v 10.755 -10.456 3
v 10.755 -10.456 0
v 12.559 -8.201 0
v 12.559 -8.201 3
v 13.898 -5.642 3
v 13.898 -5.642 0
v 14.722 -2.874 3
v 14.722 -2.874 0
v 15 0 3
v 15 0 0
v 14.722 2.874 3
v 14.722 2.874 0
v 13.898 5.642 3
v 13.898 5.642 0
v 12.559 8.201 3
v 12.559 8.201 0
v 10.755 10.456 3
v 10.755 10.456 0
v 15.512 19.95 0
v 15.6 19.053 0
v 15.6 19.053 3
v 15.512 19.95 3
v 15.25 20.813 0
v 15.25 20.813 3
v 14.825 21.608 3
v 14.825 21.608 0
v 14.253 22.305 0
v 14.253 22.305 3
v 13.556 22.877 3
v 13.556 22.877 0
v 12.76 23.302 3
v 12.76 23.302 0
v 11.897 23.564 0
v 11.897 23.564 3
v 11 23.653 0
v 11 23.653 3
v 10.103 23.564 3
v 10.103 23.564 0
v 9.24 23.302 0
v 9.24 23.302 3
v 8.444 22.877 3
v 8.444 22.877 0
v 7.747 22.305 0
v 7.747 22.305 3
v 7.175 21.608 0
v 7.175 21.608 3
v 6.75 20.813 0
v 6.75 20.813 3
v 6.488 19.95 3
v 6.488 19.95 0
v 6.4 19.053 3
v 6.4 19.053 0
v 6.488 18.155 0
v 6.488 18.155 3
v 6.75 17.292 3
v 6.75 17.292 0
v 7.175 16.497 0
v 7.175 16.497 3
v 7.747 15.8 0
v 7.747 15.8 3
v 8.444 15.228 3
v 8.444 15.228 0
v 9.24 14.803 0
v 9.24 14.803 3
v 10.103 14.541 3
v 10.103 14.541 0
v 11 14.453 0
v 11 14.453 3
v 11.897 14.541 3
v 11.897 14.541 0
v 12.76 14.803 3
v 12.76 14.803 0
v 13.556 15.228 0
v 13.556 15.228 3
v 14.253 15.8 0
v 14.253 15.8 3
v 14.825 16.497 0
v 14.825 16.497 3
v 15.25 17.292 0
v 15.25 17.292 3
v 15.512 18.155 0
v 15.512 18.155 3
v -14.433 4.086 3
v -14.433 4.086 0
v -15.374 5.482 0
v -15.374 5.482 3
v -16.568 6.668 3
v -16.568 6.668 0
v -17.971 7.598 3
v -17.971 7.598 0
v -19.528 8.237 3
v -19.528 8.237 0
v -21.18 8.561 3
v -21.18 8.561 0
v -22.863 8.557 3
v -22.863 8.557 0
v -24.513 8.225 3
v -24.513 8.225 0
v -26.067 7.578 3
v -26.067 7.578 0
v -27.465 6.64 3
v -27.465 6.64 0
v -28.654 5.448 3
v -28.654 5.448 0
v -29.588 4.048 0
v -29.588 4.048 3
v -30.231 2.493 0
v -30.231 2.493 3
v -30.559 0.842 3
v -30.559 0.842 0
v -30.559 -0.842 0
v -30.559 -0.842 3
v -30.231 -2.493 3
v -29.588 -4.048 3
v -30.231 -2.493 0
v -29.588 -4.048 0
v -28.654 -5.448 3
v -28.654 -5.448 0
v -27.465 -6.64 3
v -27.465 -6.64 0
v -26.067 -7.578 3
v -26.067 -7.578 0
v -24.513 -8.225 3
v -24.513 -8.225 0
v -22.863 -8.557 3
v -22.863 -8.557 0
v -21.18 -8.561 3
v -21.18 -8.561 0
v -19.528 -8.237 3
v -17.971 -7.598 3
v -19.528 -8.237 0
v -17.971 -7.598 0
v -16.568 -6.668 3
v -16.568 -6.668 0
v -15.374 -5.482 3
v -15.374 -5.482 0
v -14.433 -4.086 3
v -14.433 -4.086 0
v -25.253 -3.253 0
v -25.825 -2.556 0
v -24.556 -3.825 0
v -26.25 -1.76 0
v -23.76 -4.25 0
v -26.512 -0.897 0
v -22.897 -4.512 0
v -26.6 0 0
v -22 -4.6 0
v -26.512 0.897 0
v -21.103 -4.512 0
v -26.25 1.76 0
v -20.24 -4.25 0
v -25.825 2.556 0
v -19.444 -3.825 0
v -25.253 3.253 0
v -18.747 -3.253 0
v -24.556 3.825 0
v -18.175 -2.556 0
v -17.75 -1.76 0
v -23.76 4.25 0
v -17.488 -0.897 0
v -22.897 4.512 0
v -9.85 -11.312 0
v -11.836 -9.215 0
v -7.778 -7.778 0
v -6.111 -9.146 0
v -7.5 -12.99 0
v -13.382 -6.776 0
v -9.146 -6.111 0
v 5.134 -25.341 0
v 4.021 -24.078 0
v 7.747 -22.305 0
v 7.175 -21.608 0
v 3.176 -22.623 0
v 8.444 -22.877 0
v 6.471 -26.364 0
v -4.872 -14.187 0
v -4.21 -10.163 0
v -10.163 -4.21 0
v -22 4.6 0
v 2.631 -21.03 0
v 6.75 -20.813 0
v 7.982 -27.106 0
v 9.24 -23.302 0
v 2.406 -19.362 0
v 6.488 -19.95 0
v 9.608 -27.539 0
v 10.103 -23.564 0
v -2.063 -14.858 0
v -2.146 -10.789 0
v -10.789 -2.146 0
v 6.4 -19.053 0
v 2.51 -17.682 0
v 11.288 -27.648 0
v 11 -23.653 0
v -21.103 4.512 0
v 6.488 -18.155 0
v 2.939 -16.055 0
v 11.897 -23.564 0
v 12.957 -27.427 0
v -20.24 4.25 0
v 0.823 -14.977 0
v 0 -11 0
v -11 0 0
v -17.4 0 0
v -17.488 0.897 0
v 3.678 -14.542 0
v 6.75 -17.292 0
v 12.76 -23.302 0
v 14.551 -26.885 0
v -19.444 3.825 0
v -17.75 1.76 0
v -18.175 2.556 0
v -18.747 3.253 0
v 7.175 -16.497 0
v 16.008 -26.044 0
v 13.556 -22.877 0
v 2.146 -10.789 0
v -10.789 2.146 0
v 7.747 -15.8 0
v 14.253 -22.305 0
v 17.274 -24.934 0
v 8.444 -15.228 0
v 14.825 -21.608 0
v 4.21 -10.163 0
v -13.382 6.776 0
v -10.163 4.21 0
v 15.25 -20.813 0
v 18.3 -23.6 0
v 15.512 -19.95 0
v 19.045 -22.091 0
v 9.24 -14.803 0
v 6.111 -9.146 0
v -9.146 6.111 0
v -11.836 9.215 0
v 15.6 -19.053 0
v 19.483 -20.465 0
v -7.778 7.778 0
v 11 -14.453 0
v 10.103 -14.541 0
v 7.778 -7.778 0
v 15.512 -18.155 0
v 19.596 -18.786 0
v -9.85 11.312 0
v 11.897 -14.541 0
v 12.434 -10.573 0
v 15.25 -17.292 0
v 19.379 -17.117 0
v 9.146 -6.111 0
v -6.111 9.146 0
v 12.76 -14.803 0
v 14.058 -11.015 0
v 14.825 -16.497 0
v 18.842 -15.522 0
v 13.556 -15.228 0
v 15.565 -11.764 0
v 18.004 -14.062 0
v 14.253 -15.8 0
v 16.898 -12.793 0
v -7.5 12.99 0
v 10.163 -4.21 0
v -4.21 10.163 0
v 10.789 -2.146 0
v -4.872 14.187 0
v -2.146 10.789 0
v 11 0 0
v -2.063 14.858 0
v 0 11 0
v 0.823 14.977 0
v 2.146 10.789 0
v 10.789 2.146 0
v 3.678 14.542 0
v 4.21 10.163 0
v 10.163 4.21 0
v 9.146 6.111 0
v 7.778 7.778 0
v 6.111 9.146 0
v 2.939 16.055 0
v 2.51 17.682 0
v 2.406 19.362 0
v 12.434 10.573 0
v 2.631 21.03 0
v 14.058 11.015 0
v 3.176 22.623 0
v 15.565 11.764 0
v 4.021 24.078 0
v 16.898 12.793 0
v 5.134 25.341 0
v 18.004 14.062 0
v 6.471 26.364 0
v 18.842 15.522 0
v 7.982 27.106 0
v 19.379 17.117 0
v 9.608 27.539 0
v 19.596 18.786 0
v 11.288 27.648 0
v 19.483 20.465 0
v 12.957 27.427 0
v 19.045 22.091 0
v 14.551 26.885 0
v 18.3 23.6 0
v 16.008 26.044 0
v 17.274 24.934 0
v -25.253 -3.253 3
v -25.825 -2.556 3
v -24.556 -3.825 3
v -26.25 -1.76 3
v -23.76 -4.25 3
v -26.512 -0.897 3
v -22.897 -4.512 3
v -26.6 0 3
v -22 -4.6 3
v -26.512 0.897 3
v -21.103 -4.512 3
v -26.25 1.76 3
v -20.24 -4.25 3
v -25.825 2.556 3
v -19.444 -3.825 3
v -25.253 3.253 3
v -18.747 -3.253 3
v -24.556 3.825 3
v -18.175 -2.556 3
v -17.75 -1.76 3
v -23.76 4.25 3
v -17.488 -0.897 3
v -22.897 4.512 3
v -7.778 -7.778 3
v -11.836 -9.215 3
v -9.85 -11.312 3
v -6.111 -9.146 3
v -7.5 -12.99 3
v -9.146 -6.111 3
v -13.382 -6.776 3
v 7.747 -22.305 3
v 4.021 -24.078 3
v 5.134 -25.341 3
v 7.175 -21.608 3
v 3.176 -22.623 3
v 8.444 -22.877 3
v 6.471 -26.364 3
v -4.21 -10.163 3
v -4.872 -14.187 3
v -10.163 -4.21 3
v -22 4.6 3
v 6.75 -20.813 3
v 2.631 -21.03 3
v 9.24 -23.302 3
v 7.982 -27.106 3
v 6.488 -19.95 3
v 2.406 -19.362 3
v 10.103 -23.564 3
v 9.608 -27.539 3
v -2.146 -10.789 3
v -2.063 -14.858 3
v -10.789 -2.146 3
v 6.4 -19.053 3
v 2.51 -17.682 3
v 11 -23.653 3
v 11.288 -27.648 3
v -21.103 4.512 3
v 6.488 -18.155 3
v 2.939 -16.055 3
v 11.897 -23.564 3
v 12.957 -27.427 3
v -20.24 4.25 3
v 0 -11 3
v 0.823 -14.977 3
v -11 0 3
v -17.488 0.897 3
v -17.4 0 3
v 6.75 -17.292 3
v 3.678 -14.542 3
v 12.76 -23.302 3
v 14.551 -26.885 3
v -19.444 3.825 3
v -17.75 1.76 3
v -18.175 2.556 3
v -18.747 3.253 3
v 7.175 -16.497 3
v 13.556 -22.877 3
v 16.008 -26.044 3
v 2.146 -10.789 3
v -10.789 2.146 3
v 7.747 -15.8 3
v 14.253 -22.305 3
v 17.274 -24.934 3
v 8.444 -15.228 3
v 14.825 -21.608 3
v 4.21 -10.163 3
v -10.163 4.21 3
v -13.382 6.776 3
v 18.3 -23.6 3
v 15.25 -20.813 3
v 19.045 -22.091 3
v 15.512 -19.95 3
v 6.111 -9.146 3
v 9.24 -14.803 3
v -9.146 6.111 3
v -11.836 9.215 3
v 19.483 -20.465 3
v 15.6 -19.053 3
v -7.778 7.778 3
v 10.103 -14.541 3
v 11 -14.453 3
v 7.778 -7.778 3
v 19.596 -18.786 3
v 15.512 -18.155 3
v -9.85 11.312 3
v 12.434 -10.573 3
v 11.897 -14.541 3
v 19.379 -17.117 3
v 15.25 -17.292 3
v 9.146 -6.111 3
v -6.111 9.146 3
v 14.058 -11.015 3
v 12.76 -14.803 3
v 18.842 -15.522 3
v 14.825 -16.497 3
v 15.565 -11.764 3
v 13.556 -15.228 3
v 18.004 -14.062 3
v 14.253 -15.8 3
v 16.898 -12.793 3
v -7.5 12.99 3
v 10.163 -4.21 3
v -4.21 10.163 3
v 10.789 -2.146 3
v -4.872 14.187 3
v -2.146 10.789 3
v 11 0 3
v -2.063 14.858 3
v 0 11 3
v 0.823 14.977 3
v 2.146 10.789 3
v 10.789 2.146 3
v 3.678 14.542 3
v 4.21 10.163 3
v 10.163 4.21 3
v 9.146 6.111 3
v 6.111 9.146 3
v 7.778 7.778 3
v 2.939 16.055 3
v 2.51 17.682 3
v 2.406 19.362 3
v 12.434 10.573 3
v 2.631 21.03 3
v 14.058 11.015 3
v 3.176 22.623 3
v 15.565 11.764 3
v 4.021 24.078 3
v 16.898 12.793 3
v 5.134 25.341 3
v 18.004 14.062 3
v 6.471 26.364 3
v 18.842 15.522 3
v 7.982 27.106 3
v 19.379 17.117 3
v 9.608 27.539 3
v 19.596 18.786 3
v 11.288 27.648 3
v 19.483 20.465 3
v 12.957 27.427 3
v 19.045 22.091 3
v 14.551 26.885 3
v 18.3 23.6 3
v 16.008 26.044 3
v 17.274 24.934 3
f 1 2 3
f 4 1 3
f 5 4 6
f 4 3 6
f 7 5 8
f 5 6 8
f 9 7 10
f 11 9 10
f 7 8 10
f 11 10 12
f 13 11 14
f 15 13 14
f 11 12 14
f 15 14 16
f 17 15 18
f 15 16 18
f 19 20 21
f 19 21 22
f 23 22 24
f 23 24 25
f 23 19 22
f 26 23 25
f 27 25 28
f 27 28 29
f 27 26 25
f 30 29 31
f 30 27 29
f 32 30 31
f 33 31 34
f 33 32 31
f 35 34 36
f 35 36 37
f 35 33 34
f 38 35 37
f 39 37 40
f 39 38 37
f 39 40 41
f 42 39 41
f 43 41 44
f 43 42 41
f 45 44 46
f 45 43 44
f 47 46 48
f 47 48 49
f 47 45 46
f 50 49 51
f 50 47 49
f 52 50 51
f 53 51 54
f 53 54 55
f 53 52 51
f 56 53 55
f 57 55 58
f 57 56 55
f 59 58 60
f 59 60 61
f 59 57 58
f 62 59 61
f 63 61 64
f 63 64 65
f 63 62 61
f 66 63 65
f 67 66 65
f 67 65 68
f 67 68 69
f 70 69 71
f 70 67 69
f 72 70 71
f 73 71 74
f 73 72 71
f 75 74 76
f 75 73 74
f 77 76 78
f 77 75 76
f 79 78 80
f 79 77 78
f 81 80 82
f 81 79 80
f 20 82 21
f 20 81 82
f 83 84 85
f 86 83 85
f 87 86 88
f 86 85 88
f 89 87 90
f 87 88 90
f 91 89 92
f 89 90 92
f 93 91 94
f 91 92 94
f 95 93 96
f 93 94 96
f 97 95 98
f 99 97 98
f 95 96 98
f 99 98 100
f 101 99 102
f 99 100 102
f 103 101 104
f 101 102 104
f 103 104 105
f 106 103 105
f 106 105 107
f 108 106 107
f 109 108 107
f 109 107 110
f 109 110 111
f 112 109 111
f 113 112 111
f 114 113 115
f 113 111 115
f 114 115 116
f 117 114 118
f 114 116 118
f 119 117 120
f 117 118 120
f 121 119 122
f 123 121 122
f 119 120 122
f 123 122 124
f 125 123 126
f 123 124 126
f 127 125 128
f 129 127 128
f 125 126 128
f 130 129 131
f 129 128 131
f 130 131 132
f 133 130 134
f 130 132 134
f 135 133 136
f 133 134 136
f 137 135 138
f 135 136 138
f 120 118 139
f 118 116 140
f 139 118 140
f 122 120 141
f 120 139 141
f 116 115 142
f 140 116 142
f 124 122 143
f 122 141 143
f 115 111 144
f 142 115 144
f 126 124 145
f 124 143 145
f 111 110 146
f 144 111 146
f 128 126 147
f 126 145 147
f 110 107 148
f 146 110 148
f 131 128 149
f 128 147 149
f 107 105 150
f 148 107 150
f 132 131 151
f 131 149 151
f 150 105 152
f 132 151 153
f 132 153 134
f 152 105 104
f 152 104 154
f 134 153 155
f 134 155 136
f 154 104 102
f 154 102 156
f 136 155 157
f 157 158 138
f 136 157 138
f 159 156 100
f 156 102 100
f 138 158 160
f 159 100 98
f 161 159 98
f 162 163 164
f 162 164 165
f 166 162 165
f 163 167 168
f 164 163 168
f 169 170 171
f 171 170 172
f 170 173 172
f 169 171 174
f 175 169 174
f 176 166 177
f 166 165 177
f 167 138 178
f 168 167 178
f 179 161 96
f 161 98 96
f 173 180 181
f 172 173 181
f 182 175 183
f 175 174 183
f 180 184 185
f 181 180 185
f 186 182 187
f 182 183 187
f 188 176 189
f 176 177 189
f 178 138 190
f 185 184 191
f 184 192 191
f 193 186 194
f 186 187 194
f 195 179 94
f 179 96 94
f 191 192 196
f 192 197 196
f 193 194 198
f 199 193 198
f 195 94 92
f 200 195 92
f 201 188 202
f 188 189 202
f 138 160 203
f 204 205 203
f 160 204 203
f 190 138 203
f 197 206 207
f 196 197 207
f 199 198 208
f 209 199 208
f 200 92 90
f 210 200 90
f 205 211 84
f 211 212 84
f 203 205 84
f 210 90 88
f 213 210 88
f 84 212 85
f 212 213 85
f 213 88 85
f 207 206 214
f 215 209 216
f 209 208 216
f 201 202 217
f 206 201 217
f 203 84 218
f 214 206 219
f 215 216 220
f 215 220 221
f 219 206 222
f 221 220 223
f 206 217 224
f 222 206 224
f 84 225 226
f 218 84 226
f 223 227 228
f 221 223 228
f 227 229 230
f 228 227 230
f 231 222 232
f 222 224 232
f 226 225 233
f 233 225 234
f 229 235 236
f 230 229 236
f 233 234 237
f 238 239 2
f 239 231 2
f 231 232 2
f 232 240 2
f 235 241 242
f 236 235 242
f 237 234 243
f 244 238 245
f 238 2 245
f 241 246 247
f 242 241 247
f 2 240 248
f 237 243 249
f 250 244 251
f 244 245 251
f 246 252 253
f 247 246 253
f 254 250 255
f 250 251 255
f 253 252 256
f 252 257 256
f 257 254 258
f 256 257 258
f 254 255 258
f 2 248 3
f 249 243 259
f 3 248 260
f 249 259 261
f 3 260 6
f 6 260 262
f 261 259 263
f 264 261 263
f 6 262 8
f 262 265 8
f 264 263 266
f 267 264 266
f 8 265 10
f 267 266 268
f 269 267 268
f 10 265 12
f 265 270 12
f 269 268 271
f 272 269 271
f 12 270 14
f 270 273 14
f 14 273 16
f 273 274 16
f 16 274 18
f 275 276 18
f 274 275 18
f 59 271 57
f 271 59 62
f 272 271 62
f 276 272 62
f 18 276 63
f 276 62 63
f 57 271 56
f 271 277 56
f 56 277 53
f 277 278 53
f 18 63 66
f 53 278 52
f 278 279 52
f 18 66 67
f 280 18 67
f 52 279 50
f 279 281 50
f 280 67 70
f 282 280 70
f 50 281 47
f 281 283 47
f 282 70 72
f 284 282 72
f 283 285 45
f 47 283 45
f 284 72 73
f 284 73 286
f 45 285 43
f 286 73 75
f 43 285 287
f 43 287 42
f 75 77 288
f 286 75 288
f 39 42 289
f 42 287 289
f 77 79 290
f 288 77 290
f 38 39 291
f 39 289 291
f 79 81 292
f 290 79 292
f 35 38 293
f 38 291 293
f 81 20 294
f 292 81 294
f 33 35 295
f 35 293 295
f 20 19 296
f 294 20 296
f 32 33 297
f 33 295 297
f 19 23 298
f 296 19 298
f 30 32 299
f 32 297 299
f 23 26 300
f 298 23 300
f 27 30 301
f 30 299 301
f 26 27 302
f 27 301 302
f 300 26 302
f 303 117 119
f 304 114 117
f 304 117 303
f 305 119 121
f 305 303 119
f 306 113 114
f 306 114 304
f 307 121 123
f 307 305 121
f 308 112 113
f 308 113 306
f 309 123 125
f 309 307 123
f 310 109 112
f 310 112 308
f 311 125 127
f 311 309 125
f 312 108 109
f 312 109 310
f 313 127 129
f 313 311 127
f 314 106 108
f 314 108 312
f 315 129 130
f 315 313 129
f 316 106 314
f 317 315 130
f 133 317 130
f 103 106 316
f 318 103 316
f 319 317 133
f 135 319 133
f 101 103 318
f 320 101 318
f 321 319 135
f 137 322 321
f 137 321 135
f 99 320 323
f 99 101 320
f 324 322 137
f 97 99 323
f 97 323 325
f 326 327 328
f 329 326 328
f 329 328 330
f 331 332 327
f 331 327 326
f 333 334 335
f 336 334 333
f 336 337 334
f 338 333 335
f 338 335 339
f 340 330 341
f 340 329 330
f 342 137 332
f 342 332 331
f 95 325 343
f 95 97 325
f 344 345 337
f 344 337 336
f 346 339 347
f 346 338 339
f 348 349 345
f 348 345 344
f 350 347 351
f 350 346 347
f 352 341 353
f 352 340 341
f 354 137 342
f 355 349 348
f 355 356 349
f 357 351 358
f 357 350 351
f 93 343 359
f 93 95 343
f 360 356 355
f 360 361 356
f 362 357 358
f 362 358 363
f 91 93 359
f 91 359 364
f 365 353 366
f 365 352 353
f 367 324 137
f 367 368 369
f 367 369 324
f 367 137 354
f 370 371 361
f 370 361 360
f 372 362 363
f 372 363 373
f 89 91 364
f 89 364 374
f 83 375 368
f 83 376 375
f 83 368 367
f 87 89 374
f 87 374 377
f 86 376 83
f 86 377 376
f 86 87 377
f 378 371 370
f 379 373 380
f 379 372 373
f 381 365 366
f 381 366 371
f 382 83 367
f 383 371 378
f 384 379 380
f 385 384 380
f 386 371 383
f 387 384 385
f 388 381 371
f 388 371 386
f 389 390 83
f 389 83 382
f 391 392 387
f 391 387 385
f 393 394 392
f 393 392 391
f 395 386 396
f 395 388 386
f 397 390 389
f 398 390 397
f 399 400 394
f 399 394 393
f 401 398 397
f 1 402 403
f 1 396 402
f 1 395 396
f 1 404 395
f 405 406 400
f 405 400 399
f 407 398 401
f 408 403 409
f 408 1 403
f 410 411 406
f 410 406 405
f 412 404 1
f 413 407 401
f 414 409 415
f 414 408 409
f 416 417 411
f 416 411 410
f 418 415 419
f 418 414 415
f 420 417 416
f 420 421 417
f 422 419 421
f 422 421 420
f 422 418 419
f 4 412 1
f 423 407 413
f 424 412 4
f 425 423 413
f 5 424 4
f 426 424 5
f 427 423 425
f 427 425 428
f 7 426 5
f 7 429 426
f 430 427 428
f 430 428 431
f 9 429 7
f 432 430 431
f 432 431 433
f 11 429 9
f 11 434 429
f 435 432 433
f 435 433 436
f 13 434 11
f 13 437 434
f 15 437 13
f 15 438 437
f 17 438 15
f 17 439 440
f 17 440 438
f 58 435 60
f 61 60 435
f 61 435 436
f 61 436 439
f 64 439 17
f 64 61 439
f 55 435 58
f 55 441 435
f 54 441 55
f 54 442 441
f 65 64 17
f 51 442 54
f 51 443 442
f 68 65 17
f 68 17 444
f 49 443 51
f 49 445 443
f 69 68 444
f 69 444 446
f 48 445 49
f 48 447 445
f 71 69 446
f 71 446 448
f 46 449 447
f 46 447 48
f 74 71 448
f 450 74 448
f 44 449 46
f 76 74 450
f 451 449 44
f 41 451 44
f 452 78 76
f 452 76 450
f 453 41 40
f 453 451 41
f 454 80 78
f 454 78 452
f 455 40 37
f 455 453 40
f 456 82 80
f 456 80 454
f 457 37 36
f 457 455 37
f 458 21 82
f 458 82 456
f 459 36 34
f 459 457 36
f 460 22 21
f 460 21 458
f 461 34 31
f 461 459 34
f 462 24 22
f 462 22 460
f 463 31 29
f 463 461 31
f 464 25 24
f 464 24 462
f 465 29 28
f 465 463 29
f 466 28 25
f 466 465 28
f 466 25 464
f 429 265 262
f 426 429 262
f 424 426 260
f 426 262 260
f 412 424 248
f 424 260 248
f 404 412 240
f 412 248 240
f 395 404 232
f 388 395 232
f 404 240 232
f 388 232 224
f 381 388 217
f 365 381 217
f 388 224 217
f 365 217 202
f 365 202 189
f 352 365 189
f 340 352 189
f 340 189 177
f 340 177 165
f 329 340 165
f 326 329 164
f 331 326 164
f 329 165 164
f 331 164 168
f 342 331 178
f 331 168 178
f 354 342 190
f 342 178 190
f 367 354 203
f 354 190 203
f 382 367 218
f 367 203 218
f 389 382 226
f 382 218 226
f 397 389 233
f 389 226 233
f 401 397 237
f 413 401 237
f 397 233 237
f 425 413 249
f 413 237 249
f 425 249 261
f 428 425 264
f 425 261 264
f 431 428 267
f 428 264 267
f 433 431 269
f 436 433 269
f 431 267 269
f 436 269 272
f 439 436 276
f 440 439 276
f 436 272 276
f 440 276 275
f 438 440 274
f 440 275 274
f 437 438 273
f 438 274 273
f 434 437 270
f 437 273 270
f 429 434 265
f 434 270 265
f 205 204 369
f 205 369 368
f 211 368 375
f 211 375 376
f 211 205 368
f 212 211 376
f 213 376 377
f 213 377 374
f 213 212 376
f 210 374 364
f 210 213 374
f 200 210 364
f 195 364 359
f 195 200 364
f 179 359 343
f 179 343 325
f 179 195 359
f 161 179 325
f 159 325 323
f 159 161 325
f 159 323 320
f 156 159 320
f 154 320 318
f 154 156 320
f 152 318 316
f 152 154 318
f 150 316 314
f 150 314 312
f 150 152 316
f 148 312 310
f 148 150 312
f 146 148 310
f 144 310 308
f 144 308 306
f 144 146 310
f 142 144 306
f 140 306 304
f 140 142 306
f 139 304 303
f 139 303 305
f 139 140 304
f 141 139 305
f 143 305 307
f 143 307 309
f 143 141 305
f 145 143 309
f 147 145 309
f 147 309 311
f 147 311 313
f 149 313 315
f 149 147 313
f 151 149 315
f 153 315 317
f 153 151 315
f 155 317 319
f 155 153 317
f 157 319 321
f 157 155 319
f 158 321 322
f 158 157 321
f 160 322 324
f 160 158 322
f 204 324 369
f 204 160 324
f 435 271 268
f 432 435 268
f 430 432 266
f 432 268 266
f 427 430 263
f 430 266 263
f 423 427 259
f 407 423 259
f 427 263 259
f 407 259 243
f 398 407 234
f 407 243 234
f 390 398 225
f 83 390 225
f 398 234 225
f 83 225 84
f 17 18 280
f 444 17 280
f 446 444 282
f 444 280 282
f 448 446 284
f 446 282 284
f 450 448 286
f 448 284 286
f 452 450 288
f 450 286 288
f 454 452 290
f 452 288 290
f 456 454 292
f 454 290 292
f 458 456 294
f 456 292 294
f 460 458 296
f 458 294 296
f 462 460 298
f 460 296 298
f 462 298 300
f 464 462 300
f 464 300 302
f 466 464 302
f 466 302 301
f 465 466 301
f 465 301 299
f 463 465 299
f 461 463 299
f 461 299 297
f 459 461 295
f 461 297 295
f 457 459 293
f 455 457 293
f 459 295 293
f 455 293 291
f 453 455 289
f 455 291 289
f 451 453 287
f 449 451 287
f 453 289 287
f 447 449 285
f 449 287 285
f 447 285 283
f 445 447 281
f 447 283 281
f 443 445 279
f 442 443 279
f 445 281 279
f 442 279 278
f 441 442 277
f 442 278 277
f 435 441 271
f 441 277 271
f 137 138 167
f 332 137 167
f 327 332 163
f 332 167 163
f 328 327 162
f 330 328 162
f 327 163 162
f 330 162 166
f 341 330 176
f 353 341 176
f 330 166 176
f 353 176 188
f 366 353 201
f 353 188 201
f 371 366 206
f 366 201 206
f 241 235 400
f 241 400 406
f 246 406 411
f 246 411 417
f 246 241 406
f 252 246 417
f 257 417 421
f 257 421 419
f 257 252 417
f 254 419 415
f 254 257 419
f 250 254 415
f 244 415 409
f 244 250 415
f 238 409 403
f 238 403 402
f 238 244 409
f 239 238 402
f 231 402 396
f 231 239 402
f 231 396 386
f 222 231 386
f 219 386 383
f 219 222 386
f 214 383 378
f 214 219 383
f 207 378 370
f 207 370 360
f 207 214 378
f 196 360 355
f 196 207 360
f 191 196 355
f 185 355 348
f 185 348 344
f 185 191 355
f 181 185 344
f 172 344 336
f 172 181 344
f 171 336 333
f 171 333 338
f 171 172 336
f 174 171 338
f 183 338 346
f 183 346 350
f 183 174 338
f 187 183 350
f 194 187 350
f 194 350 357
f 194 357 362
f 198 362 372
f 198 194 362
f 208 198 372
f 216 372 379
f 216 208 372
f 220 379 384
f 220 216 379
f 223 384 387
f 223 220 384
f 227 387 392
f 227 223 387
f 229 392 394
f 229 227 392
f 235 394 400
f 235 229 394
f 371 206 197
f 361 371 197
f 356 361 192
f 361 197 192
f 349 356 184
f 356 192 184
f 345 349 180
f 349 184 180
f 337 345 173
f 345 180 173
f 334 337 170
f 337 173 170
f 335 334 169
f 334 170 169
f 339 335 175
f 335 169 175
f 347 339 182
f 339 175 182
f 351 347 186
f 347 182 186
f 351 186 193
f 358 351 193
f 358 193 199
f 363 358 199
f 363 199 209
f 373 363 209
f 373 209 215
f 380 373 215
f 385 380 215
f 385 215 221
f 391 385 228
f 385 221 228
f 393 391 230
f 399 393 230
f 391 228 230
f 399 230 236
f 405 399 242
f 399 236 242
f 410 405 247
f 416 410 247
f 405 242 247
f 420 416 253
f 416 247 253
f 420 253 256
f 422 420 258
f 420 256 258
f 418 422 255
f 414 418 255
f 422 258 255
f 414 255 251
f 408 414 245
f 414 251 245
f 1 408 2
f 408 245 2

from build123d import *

# Parameters (mm, degrees)
F0_R     = 4.6
F1_DEPTH = 3


with BuildPart() as f1:
    # F0 (on Top) → F1 (new body)
    with BuildSketch(Plane.XY):
        with BuildLine():
            ThreePointArc((-11, 0), (0, -11), (11, 0))
            ThreePointArc((11, 0), (0, 11), (-11, 0))
        make_face()
        with Locations((-22, 0)):
            Circle(F0_R)
        with BuildLine():
            ThreePointArc((-14.432727, 4.086121), (-30.6, 0), (-14.432727, -4.086121))
            ThreePointArc((-14.432727, -4.086121), (-7.5, -12.990381), (3.677679, -14.542169))
            ThreePointArc((3.677679, -14.542169), (15.3, -26.500377), (10.755048, -10.456048))
            ThreePointArc((10.755048, -10.456048), (15, 0), (10.755048, 10.456048))
            ThreePointArc((10.755048, 10.456048), (15.3, 26.500377), (3.677679, 14.542169))
            ThreePointArc((3.677679, 14.542169), (-7.5, 12.990381), (-14.432727, 4.086121))
        make_face()
        with Locations((11, -19.052559)):
            Circle(F0_R, mode=Mode.SUBTRACT)
        with Locations((-22, 0)):
            Circle(F0_R, mode=Mode.SUBTRACT)
        with BuildLine():
            ThreePointArc((-11, 0), (0, 11), (11, 0))
            ThreePointArc((11, 0), (0, -11), (-11, 0))
        make_face(mode=Mode.SUBTRACT)
        with Locations((11, 19.052559)):
            Circle(F0_R, mode=Mode.SUBTRACT)
    extrude(amount=F1_DEPTH)


solid = f1.part
